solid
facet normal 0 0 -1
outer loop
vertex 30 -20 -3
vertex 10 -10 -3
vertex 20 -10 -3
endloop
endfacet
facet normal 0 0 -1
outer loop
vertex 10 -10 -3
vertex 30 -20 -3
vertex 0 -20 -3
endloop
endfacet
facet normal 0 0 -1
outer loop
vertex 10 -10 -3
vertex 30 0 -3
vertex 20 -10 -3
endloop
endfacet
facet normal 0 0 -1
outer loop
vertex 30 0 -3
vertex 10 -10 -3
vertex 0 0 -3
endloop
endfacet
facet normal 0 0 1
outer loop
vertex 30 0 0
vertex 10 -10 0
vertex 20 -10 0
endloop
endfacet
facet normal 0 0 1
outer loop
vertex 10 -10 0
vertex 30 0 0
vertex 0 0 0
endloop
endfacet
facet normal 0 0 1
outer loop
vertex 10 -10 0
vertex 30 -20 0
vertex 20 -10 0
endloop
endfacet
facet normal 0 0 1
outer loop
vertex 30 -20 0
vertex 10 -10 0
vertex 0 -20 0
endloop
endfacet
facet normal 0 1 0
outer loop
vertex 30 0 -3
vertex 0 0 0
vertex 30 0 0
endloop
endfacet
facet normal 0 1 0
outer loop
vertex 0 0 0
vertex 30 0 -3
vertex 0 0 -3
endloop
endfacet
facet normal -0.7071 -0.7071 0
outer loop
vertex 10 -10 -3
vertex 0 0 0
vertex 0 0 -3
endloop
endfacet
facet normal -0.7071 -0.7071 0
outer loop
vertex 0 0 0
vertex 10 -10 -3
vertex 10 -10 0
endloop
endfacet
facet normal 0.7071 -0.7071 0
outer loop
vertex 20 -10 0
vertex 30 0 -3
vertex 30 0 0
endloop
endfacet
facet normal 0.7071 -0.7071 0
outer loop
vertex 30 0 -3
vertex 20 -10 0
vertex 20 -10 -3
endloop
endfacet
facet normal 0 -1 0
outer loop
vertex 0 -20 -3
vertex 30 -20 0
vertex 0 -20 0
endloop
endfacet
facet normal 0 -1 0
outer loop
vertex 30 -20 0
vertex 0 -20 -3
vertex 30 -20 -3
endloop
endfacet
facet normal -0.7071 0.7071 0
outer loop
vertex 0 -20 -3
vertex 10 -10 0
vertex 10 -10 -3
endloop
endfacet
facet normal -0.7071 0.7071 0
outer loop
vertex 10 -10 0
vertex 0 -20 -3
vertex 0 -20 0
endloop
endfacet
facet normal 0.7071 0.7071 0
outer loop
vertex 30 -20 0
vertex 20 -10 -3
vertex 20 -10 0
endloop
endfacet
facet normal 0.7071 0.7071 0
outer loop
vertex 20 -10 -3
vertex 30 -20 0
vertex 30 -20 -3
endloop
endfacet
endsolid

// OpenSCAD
module zapf() {
    difference() {
        cube([30, 10, 3]);
        rotate([0, 0, 45]) cube([15, 15, 4]);
        translate([30, 0, 0]) rotate([0, 0, 45]) cube([15, 15, 4]);
    }
}

rotate([180, 0, 0]) zapf();
translate([0, -20, -3]) zapf();
